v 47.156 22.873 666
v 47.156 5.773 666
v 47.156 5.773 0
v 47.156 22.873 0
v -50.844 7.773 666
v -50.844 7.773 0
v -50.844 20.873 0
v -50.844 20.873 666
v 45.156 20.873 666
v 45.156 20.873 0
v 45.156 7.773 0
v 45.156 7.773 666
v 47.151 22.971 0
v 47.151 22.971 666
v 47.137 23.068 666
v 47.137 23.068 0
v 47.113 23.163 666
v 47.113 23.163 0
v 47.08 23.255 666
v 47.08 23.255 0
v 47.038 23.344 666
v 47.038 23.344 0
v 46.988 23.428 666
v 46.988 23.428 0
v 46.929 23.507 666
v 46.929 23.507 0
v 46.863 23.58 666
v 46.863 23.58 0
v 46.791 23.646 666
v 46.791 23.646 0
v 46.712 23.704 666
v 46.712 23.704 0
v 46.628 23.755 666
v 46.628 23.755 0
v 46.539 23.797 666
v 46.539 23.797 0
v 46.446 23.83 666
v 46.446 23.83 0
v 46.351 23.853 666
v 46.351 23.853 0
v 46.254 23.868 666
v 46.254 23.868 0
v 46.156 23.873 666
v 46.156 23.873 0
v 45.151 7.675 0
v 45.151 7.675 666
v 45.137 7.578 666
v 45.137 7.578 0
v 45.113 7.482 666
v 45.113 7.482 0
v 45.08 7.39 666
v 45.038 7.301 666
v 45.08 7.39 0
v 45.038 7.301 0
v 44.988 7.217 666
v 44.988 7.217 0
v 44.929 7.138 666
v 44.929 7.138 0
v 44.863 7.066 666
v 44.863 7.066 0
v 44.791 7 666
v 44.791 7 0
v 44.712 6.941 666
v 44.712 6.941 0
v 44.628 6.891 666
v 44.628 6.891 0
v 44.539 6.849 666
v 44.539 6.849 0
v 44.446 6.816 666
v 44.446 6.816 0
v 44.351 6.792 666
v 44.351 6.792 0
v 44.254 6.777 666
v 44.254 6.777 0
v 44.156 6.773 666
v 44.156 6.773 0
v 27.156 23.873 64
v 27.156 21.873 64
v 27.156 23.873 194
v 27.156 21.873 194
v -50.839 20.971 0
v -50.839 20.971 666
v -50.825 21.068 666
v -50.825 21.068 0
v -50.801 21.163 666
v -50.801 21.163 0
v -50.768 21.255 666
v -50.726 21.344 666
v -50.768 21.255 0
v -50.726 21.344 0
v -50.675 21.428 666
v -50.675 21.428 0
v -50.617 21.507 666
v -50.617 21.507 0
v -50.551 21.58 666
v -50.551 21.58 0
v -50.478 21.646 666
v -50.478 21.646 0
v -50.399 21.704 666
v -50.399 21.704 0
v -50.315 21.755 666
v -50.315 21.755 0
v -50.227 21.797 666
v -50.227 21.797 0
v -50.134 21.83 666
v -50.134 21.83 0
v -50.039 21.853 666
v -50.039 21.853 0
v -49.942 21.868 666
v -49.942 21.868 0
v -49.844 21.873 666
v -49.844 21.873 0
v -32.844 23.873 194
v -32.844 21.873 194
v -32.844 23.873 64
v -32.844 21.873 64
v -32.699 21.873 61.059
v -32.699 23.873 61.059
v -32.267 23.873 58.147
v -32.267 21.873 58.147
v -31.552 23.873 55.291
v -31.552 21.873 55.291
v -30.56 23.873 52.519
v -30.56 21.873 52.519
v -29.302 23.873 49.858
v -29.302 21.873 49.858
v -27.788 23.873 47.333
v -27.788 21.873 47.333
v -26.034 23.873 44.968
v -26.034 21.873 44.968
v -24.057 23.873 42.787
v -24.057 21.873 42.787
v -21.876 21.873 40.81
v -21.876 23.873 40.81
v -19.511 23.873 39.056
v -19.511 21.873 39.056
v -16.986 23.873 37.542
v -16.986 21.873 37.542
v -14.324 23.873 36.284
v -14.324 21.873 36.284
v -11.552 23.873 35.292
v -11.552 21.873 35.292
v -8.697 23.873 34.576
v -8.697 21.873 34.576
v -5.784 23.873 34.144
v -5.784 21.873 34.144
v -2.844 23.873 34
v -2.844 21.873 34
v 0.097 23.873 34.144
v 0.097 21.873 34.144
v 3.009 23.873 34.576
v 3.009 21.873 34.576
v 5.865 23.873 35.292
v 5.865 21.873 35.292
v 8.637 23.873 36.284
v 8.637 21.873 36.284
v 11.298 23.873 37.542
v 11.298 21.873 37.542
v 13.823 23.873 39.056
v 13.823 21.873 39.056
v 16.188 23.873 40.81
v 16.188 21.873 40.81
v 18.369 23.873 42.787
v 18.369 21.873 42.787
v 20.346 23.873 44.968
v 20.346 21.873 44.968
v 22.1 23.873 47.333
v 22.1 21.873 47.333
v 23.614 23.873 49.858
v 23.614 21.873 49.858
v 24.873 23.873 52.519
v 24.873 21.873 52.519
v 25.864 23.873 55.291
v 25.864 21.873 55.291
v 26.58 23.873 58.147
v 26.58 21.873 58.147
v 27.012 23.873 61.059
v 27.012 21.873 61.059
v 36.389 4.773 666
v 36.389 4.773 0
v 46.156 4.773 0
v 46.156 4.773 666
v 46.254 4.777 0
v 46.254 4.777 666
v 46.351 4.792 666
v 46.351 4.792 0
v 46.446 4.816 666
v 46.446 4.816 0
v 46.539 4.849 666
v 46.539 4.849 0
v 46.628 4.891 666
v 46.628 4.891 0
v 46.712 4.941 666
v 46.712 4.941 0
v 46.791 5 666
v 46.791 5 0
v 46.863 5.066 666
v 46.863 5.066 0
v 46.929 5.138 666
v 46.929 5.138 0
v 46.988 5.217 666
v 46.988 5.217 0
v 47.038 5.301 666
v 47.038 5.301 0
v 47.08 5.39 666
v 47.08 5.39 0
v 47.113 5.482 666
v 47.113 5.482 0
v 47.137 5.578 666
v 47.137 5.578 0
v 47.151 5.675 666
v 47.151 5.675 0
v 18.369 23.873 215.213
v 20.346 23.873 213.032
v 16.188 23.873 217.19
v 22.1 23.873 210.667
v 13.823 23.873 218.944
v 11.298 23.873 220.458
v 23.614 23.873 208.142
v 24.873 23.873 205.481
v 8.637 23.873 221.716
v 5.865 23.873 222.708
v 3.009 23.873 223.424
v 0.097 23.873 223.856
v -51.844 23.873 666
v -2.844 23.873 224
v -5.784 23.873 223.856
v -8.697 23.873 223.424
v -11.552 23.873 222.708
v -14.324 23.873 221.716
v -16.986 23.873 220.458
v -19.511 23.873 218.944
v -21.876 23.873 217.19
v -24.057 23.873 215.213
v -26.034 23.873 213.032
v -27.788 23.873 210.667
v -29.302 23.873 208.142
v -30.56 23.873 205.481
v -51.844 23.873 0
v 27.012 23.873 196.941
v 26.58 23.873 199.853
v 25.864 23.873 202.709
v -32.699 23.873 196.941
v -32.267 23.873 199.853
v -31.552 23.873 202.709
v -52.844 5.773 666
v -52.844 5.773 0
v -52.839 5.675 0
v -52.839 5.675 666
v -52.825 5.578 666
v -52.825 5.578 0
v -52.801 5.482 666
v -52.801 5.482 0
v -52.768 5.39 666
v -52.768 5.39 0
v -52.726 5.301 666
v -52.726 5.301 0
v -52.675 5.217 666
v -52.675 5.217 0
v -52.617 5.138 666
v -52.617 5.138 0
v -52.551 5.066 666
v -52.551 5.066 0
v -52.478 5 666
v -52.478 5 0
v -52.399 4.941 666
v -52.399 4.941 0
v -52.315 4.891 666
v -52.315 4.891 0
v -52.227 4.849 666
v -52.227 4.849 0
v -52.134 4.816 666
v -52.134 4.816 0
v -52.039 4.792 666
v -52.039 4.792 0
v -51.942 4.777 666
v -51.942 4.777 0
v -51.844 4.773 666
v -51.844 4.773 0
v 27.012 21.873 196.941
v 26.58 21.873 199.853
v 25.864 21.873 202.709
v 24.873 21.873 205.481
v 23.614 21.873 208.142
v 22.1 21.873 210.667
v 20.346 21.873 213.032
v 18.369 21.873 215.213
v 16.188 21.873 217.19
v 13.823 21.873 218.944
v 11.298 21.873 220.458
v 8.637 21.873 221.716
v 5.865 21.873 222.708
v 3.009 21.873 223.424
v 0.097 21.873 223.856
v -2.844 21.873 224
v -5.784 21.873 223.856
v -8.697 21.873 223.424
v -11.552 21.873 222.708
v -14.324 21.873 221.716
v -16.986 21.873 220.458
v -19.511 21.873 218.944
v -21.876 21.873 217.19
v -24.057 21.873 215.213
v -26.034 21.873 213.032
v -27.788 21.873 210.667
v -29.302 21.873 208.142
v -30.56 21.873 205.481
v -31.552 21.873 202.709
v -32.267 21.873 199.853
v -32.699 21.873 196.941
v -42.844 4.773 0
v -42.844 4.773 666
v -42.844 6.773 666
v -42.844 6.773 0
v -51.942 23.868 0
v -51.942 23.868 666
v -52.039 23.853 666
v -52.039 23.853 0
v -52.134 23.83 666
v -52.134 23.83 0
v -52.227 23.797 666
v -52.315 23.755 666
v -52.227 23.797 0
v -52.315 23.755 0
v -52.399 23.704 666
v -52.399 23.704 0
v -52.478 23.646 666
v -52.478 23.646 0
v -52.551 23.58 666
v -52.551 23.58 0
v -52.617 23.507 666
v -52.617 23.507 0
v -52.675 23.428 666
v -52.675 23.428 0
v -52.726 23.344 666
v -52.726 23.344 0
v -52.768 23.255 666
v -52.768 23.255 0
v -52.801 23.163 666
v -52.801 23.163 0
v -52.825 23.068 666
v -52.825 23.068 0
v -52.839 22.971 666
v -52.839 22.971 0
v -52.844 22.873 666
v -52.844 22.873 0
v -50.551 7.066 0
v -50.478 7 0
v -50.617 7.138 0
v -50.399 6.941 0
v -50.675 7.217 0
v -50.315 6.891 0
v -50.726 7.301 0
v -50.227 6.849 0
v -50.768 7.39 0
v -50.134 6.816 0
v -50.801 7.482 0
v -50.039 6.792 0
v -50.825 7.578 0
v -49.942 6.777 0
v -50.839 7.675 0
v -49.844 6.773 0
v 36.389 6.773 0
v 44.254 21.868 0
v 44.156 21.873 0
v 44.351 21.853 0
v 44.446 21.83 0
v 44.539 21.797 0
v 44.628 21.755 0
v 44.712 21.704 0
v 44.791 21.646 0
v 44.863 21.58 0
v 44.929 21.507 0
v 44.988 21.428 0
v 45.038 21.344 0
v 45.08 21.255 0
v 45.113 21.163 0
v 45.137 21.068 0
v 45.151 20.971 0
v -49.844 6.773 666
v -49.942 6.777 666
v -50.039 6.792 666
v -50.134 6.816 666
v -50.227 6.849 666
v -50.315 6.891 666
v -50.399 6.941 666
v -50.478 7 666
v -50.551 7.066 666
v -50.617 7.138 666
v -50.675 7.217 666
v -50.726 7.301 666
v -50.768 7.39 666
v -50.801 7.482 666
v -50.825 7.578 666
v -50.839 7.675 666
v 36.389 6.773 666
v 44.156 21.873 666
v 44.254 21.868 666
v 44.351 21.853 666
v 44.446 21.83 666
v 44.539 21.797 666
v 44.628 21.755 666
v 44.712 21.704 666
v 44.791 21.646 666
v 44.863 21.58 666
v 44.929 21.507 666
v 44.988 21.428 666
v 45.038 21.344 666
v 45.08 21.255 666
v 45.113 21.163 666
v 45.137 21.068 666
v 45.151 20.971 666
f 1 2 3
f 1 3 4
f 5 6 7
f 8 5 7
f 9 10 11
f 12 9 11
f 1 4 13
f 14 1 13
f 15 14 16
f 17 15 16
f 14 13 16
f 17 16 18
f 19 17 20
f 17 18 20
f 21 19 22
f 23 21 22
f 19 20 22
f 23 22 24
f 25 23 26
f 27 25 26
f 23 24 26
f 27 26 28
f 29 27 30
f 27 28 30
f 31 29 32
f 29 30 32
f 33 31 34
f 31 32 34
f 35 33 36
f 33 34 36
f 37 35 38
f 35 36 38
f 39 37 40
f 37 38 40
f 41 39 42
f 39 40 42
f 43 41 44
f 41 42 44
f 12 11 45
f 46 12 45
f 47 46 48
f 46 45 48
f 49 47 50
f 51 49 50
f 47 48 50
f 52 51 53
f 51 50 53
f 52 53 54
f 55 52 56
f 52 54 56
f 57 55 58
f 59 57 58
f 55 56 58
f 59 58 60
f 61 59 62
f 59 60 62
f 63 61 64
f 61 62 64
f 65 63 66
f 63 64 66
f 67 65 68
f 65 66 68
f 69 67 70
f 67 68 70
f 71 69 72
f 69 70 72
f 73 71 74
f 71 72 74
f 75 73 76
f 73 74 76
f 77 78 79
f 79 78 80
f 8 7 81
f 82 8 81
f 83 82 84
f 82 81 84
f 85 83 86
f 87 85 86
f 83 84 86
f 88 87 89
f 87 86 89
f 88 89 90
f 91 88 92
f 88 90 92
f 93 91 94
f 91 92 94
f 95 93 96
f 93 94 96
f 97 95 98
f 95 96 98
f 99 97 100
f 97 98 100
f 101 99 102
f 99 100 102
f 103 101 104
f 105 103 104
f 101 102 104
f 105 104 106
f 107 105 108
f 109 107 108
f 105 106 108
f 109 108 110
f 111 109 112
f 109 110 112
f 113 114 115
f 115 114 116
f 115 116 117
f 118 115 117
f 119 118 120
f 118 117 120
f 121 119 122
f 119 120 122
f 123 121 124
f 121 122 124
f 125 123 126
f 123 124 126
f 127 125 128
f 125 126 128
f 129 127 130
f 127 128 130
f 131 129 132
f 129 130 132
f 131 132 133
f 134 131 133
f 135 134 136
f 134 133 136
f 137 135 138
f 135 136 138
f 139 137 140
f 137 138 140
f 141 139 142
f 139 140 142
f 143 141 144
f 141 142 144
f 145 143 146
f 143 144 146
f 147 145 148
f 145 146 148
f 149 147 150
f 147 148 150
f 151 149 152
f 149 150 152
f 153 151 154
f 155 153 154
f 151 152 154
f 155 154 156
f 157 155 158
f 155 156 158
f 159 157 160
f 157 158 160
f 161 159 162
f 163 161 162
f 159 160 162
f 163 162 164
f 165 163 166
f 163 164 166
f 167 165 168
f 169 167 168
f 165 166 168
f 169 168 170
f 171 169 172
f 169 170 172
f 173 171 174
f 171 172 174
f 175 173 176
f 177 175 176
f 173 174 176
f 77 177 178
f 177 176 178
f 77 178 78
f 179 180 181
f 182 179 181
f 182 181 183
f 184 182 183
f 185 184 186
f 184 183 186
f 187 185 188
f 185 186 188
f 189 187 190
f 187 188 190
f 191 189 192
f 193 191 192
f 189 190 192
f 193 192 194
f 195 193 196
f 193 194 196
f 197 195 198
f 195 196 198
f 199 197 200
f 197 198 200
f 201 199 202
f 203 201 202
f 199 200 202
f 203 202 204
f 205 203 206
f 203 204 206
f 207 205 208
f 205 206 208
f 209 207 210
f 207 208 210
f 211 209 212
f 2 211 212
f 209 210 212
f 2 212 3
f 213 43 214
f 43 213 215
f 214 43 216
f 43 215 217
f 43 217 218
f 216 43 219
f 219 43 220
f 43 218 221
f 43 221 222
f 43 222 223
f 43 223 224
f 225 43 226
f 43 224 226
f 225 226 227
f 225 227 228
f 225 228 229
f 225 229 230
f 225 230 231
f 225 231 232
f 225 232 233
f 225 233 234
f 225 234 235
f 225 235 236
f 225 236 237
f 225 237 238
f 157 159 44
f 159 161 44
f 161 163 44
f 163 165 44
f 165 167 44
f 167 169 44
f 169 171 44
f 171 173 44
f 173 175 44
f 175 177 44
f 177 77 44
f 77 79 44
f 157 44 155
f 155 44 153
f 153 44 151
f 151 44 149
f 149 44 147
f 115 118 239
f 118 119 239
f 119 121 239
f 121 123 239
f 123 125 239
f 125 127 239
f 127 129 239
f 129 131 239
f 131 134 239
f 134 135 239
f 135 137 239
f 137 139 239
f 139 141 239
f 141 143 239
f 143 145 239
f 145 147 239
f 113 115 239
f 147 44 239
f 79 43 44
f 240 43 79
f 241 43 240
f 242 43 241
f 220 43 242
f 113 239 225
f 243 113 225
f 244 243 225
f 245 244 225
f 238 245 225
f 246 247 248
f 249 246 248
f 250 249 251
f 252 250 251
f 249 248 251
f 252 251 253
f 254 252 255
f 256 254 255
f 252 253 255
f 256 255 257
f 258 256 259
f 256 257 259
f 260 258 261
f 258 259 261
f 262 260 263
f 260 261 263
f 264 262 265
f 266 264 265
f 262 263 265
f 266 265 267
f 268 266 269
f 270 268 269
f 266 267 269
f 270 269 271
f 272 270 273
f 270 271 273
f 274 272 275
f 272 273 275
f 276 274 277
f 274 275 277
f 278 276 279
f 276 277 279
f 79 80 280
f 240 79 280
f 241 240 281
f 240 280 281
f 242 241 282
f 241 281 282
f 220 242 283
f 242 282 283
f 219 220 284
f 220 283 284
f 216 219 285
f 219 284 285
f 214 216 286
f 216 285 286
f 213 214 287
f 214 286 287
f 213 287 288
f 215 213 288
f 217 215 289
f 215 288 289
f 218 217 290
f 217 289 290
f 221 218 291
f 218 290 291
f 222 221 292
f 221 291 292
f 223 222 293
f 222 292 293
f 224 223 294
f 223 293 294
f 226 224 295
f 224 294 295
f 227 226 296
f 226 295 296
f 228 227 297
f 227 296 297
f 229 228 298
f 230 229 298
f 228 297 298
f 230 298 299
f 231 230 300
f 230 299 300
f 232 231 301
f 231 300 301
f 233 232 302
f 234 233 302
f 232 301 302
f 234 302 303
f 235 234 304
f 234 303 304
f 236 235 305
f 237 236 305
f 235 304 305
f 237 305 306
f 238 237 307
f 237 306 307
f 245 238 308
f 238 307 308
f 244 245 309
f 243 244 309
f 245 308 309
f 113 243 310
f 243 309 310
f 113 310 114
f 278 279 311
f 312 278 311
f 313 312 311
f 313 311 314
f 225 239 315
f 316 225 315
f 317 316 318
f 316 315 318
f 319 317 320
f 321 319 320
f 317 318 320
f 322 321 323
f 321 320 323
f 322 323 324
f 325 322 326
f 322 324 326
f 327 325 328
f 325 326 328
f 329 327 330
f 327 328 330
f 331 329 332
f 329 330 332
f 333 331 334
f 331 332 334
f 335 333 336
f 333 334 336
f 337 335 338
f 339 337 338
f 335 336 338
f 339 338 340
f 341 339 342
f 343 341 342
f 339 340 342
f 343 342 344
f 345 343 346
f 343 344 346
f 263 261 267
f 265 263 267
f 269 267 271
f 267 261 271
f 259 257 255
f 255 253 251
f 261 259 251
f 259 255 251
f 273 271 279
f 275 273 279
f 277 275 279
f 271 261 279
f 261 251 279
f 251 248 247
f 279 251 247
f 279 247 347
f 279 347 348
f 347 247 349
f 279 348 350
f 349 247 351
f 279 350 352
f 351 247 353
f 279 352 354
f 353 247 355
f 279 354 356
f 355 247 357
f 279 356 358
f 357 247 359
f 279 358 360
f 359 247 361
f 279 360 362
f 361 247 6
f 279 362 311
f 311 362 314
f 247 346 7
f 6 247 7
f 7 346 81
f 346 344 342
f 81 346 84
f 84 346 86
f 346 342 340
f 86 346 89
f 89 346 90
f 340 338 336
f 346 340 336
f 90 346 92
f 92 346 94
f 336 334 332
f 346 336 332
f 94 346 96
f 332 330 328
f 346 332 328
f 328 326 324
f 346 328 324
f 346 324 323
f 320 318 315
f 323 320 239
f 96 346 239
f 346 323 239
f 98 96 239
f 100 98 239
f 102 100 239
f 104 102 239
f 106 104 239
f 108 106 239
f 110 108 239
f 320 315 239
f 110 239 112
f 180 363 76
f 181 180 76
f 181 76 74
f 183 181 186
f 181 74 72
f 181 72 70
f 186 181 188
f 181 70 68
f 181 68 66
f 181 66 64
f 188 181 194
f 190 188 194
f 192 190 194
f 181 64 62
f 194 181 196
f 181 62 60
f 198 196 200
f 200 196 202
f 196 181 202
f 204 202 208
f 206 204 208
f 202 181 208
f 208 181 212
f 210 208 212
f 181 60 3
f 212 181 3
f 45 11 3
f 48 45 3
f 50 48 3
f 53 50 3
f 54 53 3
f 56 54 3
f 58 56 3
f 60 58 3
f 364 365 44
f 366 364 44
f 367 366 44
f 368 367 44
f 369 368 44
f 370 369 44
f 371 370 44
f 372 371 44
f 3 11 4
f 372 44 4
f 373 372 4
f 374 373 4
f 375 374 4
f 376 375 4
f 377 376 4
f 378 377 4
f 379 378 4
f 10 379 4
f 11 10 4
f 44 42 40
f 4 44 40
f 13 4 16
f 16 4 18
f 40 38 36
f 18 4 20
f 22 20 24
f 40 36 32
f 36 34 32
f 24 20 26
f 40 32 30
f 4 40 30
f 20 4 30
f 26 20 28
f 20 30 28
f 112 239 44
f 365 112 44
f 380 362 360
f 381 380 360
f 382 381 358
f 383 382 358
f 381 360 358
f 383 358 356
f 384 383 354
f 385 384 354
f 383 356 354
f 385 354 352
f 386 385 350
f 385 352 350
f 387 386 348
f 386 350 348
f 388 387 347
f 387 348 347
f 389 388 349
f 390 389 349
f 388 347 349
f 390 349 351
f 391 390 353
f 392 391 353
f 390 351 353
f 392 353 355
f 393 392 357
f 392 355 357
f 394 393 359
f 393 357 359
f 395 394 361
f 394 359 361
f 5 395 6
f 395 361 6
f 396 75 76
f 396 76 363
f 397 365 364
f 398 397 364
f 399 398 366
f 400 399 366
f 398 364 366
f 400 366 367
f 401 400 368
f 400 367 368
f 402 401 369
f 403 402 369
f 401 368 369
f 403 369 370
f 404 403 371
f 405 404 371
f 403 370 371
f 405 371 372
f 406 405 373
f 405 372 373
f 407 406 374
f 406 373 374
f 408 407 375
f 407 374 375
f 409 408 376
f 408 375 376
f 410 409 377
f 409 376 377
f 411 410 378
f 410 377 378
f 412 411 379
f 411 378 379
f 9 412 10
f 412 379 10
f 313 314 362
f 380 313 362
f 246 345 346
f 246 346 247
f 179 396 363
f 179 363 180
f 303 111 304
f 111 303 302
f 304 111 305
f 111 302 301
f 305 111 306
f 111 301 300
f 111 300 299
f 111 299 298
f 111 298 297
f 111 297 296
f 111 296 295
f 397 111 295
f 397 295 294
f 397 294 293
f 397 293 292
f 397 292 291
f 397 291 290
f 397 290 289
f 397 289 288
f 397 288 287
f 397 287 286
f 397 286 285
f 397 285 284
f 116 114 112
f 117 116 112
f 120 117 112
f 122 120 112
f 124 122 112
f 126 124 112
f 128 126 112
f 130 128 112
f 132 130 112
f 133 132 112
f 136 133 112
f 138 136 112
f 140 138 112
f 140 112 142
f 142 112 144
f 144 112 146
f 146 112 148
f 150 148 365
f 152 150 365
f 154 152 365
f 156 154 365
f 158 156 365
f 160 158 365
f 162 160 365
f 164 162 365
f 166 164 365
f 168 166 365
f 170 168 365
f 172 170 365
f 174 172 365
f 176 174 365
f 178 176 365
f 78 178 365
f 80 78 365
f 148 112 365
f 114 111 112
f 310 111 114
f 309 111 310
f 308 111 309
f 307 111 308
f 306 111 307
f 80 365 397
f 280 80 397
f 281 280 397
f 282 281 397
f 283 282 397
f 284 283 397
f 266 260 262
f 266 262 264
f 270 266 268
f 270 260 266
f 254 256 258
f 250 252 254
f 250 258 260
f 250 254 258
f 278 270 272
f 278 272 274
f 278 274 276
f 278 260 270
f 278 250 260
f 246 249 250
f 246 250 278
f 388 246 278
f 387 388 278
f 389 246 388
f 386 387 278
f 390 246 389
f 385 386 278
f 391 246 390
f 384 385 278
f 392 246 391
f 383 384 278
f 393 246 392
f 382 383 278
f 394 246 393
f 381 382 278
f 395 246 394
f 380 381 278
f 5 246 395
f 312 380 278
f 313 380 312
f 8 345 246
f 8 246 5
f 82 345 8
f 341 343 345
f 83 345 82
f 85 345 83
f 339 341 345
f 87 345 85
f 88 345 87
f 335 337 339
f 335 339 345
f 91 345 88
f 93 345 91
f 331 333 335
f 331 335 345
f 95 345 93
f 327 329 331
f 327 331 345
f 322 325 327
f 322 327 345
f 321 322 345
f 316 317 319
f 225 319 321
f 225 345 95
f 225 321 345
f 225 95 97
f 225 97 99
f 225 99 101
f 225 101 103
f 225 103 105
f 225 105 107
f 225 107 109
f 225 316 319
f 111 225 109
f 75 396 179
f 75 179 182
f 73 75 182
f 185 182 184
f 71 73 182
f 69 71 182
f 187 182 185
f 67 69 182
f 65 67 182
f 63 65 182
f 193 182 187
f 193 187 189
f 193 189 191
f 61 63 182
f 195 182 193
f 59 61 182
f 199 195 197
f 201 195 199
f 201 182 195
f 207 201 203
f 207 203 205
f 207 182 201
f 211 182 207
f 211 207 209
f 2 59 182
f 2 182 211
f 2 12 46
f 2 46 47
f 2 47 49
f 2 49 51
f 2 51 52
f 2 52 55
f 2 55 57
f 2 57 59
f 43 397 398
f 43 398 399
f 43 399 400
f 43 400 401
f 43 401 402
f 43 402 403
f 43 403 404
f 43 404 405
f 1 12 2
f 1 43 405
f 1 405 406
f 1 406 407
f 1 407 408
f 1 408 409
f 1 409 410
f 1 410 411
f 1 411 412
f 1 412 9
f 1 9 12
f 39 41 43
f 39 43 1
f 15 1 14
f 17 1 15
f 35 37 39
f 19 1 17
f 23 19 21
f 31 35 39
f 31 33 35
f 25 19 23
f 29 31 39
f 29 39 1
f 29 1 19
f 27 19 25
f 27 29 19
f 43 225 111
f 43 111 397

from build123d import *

# Parameters (mm, degrees)
F1_DEPTH = 666
F3_DEPTH = 2


with BuildPart() as f1:
    # F0 (on Top) → F1 (new body)
    with BuildSketch(Plane.XY):
        with BuildLine():
            Line((46.156122, 23.872672), (-51.843878, 23.872672))
            ThreePointArc((-51.843878, 23.872672), (-52.550985, 23.579779), (-52.843878, 22.872672))
            Line((-52.843878, 22.872672), (-52.843878, 5.772672))
            ThreePointArc((-52.843878, 5.772672), (-52.550985, 5.065565), (-51.843878, 4.772672))
            Line((-51.843878, 4.772672), (-42.843878, 4.772672))
            Line((-42.843878, 4.772672), (-42.843878, 6.772672))
            Line((-42.843878, 6.772672), (-49.843878, 6.772672))
            ThreePointArc((-49.843878, 6.772672), (-50.550985, 7.065565), (-50.843878, 7.772672))
            Line((-50.843878, 7.772672), (-50.843878, 20.872672))
            ThreePointArc((-50.843878, 20.872672), (-50.550985, 21.579779), (-49.843878, 21.872672))
            Line((-49.843878, 21.872672), (44.156122, 21.872672))
            ThreePointArc((44.156122, 21.872672), (44.863229, 21.579779), (45.156122, 20.872672))
            Line((45.156122, 20.872672), (45.156122, 7.772672))
            ThreePointArc((45.156122, 7.772672), (44.863229, 7.065565), (44.156122, 6.772672))
            Line((44.156122, 6.772672), (36.389313, 6.772672))
            Line((36.389313, 6.772672), (36.389313, 4.772672))
            Line((36.389313, 4.772672), (46.156122, 4.772672))
            ThreePointArc((46.156122, 4.772672), (46.863229, 5.065565), (47.156122, 5.772672))
            Line((47.156122, 5.772672), (47.156122, 22.872672))
            ThreePointArc((47.156122, 22.872672), (46.863229, 23.579779), (46.156122, 23.872672))
        make_face()
    extrude(amount=F1_DEPTH)

    # F2 (on face) → F3 (cut, through all)
    with BuildSketch(Plane.XZ.offset(-21.872672)):
        with BuildLine():
            ThreePointArc((-32.843878, 64), (-2.843878, 34), (27.156122, 64))
            Line((27.156122, 64), (27.156122, 194))
            ThreePointArc((27.156122, 194), (-2.843878, 224), (-32.843878, 194))
            Line((-32.843878, 194), (-32.843878, 64))
        make_face()
    extrude(amount=-F3_DEPTH, mode=Mode.SUBTRACT)


solid = f1.part
